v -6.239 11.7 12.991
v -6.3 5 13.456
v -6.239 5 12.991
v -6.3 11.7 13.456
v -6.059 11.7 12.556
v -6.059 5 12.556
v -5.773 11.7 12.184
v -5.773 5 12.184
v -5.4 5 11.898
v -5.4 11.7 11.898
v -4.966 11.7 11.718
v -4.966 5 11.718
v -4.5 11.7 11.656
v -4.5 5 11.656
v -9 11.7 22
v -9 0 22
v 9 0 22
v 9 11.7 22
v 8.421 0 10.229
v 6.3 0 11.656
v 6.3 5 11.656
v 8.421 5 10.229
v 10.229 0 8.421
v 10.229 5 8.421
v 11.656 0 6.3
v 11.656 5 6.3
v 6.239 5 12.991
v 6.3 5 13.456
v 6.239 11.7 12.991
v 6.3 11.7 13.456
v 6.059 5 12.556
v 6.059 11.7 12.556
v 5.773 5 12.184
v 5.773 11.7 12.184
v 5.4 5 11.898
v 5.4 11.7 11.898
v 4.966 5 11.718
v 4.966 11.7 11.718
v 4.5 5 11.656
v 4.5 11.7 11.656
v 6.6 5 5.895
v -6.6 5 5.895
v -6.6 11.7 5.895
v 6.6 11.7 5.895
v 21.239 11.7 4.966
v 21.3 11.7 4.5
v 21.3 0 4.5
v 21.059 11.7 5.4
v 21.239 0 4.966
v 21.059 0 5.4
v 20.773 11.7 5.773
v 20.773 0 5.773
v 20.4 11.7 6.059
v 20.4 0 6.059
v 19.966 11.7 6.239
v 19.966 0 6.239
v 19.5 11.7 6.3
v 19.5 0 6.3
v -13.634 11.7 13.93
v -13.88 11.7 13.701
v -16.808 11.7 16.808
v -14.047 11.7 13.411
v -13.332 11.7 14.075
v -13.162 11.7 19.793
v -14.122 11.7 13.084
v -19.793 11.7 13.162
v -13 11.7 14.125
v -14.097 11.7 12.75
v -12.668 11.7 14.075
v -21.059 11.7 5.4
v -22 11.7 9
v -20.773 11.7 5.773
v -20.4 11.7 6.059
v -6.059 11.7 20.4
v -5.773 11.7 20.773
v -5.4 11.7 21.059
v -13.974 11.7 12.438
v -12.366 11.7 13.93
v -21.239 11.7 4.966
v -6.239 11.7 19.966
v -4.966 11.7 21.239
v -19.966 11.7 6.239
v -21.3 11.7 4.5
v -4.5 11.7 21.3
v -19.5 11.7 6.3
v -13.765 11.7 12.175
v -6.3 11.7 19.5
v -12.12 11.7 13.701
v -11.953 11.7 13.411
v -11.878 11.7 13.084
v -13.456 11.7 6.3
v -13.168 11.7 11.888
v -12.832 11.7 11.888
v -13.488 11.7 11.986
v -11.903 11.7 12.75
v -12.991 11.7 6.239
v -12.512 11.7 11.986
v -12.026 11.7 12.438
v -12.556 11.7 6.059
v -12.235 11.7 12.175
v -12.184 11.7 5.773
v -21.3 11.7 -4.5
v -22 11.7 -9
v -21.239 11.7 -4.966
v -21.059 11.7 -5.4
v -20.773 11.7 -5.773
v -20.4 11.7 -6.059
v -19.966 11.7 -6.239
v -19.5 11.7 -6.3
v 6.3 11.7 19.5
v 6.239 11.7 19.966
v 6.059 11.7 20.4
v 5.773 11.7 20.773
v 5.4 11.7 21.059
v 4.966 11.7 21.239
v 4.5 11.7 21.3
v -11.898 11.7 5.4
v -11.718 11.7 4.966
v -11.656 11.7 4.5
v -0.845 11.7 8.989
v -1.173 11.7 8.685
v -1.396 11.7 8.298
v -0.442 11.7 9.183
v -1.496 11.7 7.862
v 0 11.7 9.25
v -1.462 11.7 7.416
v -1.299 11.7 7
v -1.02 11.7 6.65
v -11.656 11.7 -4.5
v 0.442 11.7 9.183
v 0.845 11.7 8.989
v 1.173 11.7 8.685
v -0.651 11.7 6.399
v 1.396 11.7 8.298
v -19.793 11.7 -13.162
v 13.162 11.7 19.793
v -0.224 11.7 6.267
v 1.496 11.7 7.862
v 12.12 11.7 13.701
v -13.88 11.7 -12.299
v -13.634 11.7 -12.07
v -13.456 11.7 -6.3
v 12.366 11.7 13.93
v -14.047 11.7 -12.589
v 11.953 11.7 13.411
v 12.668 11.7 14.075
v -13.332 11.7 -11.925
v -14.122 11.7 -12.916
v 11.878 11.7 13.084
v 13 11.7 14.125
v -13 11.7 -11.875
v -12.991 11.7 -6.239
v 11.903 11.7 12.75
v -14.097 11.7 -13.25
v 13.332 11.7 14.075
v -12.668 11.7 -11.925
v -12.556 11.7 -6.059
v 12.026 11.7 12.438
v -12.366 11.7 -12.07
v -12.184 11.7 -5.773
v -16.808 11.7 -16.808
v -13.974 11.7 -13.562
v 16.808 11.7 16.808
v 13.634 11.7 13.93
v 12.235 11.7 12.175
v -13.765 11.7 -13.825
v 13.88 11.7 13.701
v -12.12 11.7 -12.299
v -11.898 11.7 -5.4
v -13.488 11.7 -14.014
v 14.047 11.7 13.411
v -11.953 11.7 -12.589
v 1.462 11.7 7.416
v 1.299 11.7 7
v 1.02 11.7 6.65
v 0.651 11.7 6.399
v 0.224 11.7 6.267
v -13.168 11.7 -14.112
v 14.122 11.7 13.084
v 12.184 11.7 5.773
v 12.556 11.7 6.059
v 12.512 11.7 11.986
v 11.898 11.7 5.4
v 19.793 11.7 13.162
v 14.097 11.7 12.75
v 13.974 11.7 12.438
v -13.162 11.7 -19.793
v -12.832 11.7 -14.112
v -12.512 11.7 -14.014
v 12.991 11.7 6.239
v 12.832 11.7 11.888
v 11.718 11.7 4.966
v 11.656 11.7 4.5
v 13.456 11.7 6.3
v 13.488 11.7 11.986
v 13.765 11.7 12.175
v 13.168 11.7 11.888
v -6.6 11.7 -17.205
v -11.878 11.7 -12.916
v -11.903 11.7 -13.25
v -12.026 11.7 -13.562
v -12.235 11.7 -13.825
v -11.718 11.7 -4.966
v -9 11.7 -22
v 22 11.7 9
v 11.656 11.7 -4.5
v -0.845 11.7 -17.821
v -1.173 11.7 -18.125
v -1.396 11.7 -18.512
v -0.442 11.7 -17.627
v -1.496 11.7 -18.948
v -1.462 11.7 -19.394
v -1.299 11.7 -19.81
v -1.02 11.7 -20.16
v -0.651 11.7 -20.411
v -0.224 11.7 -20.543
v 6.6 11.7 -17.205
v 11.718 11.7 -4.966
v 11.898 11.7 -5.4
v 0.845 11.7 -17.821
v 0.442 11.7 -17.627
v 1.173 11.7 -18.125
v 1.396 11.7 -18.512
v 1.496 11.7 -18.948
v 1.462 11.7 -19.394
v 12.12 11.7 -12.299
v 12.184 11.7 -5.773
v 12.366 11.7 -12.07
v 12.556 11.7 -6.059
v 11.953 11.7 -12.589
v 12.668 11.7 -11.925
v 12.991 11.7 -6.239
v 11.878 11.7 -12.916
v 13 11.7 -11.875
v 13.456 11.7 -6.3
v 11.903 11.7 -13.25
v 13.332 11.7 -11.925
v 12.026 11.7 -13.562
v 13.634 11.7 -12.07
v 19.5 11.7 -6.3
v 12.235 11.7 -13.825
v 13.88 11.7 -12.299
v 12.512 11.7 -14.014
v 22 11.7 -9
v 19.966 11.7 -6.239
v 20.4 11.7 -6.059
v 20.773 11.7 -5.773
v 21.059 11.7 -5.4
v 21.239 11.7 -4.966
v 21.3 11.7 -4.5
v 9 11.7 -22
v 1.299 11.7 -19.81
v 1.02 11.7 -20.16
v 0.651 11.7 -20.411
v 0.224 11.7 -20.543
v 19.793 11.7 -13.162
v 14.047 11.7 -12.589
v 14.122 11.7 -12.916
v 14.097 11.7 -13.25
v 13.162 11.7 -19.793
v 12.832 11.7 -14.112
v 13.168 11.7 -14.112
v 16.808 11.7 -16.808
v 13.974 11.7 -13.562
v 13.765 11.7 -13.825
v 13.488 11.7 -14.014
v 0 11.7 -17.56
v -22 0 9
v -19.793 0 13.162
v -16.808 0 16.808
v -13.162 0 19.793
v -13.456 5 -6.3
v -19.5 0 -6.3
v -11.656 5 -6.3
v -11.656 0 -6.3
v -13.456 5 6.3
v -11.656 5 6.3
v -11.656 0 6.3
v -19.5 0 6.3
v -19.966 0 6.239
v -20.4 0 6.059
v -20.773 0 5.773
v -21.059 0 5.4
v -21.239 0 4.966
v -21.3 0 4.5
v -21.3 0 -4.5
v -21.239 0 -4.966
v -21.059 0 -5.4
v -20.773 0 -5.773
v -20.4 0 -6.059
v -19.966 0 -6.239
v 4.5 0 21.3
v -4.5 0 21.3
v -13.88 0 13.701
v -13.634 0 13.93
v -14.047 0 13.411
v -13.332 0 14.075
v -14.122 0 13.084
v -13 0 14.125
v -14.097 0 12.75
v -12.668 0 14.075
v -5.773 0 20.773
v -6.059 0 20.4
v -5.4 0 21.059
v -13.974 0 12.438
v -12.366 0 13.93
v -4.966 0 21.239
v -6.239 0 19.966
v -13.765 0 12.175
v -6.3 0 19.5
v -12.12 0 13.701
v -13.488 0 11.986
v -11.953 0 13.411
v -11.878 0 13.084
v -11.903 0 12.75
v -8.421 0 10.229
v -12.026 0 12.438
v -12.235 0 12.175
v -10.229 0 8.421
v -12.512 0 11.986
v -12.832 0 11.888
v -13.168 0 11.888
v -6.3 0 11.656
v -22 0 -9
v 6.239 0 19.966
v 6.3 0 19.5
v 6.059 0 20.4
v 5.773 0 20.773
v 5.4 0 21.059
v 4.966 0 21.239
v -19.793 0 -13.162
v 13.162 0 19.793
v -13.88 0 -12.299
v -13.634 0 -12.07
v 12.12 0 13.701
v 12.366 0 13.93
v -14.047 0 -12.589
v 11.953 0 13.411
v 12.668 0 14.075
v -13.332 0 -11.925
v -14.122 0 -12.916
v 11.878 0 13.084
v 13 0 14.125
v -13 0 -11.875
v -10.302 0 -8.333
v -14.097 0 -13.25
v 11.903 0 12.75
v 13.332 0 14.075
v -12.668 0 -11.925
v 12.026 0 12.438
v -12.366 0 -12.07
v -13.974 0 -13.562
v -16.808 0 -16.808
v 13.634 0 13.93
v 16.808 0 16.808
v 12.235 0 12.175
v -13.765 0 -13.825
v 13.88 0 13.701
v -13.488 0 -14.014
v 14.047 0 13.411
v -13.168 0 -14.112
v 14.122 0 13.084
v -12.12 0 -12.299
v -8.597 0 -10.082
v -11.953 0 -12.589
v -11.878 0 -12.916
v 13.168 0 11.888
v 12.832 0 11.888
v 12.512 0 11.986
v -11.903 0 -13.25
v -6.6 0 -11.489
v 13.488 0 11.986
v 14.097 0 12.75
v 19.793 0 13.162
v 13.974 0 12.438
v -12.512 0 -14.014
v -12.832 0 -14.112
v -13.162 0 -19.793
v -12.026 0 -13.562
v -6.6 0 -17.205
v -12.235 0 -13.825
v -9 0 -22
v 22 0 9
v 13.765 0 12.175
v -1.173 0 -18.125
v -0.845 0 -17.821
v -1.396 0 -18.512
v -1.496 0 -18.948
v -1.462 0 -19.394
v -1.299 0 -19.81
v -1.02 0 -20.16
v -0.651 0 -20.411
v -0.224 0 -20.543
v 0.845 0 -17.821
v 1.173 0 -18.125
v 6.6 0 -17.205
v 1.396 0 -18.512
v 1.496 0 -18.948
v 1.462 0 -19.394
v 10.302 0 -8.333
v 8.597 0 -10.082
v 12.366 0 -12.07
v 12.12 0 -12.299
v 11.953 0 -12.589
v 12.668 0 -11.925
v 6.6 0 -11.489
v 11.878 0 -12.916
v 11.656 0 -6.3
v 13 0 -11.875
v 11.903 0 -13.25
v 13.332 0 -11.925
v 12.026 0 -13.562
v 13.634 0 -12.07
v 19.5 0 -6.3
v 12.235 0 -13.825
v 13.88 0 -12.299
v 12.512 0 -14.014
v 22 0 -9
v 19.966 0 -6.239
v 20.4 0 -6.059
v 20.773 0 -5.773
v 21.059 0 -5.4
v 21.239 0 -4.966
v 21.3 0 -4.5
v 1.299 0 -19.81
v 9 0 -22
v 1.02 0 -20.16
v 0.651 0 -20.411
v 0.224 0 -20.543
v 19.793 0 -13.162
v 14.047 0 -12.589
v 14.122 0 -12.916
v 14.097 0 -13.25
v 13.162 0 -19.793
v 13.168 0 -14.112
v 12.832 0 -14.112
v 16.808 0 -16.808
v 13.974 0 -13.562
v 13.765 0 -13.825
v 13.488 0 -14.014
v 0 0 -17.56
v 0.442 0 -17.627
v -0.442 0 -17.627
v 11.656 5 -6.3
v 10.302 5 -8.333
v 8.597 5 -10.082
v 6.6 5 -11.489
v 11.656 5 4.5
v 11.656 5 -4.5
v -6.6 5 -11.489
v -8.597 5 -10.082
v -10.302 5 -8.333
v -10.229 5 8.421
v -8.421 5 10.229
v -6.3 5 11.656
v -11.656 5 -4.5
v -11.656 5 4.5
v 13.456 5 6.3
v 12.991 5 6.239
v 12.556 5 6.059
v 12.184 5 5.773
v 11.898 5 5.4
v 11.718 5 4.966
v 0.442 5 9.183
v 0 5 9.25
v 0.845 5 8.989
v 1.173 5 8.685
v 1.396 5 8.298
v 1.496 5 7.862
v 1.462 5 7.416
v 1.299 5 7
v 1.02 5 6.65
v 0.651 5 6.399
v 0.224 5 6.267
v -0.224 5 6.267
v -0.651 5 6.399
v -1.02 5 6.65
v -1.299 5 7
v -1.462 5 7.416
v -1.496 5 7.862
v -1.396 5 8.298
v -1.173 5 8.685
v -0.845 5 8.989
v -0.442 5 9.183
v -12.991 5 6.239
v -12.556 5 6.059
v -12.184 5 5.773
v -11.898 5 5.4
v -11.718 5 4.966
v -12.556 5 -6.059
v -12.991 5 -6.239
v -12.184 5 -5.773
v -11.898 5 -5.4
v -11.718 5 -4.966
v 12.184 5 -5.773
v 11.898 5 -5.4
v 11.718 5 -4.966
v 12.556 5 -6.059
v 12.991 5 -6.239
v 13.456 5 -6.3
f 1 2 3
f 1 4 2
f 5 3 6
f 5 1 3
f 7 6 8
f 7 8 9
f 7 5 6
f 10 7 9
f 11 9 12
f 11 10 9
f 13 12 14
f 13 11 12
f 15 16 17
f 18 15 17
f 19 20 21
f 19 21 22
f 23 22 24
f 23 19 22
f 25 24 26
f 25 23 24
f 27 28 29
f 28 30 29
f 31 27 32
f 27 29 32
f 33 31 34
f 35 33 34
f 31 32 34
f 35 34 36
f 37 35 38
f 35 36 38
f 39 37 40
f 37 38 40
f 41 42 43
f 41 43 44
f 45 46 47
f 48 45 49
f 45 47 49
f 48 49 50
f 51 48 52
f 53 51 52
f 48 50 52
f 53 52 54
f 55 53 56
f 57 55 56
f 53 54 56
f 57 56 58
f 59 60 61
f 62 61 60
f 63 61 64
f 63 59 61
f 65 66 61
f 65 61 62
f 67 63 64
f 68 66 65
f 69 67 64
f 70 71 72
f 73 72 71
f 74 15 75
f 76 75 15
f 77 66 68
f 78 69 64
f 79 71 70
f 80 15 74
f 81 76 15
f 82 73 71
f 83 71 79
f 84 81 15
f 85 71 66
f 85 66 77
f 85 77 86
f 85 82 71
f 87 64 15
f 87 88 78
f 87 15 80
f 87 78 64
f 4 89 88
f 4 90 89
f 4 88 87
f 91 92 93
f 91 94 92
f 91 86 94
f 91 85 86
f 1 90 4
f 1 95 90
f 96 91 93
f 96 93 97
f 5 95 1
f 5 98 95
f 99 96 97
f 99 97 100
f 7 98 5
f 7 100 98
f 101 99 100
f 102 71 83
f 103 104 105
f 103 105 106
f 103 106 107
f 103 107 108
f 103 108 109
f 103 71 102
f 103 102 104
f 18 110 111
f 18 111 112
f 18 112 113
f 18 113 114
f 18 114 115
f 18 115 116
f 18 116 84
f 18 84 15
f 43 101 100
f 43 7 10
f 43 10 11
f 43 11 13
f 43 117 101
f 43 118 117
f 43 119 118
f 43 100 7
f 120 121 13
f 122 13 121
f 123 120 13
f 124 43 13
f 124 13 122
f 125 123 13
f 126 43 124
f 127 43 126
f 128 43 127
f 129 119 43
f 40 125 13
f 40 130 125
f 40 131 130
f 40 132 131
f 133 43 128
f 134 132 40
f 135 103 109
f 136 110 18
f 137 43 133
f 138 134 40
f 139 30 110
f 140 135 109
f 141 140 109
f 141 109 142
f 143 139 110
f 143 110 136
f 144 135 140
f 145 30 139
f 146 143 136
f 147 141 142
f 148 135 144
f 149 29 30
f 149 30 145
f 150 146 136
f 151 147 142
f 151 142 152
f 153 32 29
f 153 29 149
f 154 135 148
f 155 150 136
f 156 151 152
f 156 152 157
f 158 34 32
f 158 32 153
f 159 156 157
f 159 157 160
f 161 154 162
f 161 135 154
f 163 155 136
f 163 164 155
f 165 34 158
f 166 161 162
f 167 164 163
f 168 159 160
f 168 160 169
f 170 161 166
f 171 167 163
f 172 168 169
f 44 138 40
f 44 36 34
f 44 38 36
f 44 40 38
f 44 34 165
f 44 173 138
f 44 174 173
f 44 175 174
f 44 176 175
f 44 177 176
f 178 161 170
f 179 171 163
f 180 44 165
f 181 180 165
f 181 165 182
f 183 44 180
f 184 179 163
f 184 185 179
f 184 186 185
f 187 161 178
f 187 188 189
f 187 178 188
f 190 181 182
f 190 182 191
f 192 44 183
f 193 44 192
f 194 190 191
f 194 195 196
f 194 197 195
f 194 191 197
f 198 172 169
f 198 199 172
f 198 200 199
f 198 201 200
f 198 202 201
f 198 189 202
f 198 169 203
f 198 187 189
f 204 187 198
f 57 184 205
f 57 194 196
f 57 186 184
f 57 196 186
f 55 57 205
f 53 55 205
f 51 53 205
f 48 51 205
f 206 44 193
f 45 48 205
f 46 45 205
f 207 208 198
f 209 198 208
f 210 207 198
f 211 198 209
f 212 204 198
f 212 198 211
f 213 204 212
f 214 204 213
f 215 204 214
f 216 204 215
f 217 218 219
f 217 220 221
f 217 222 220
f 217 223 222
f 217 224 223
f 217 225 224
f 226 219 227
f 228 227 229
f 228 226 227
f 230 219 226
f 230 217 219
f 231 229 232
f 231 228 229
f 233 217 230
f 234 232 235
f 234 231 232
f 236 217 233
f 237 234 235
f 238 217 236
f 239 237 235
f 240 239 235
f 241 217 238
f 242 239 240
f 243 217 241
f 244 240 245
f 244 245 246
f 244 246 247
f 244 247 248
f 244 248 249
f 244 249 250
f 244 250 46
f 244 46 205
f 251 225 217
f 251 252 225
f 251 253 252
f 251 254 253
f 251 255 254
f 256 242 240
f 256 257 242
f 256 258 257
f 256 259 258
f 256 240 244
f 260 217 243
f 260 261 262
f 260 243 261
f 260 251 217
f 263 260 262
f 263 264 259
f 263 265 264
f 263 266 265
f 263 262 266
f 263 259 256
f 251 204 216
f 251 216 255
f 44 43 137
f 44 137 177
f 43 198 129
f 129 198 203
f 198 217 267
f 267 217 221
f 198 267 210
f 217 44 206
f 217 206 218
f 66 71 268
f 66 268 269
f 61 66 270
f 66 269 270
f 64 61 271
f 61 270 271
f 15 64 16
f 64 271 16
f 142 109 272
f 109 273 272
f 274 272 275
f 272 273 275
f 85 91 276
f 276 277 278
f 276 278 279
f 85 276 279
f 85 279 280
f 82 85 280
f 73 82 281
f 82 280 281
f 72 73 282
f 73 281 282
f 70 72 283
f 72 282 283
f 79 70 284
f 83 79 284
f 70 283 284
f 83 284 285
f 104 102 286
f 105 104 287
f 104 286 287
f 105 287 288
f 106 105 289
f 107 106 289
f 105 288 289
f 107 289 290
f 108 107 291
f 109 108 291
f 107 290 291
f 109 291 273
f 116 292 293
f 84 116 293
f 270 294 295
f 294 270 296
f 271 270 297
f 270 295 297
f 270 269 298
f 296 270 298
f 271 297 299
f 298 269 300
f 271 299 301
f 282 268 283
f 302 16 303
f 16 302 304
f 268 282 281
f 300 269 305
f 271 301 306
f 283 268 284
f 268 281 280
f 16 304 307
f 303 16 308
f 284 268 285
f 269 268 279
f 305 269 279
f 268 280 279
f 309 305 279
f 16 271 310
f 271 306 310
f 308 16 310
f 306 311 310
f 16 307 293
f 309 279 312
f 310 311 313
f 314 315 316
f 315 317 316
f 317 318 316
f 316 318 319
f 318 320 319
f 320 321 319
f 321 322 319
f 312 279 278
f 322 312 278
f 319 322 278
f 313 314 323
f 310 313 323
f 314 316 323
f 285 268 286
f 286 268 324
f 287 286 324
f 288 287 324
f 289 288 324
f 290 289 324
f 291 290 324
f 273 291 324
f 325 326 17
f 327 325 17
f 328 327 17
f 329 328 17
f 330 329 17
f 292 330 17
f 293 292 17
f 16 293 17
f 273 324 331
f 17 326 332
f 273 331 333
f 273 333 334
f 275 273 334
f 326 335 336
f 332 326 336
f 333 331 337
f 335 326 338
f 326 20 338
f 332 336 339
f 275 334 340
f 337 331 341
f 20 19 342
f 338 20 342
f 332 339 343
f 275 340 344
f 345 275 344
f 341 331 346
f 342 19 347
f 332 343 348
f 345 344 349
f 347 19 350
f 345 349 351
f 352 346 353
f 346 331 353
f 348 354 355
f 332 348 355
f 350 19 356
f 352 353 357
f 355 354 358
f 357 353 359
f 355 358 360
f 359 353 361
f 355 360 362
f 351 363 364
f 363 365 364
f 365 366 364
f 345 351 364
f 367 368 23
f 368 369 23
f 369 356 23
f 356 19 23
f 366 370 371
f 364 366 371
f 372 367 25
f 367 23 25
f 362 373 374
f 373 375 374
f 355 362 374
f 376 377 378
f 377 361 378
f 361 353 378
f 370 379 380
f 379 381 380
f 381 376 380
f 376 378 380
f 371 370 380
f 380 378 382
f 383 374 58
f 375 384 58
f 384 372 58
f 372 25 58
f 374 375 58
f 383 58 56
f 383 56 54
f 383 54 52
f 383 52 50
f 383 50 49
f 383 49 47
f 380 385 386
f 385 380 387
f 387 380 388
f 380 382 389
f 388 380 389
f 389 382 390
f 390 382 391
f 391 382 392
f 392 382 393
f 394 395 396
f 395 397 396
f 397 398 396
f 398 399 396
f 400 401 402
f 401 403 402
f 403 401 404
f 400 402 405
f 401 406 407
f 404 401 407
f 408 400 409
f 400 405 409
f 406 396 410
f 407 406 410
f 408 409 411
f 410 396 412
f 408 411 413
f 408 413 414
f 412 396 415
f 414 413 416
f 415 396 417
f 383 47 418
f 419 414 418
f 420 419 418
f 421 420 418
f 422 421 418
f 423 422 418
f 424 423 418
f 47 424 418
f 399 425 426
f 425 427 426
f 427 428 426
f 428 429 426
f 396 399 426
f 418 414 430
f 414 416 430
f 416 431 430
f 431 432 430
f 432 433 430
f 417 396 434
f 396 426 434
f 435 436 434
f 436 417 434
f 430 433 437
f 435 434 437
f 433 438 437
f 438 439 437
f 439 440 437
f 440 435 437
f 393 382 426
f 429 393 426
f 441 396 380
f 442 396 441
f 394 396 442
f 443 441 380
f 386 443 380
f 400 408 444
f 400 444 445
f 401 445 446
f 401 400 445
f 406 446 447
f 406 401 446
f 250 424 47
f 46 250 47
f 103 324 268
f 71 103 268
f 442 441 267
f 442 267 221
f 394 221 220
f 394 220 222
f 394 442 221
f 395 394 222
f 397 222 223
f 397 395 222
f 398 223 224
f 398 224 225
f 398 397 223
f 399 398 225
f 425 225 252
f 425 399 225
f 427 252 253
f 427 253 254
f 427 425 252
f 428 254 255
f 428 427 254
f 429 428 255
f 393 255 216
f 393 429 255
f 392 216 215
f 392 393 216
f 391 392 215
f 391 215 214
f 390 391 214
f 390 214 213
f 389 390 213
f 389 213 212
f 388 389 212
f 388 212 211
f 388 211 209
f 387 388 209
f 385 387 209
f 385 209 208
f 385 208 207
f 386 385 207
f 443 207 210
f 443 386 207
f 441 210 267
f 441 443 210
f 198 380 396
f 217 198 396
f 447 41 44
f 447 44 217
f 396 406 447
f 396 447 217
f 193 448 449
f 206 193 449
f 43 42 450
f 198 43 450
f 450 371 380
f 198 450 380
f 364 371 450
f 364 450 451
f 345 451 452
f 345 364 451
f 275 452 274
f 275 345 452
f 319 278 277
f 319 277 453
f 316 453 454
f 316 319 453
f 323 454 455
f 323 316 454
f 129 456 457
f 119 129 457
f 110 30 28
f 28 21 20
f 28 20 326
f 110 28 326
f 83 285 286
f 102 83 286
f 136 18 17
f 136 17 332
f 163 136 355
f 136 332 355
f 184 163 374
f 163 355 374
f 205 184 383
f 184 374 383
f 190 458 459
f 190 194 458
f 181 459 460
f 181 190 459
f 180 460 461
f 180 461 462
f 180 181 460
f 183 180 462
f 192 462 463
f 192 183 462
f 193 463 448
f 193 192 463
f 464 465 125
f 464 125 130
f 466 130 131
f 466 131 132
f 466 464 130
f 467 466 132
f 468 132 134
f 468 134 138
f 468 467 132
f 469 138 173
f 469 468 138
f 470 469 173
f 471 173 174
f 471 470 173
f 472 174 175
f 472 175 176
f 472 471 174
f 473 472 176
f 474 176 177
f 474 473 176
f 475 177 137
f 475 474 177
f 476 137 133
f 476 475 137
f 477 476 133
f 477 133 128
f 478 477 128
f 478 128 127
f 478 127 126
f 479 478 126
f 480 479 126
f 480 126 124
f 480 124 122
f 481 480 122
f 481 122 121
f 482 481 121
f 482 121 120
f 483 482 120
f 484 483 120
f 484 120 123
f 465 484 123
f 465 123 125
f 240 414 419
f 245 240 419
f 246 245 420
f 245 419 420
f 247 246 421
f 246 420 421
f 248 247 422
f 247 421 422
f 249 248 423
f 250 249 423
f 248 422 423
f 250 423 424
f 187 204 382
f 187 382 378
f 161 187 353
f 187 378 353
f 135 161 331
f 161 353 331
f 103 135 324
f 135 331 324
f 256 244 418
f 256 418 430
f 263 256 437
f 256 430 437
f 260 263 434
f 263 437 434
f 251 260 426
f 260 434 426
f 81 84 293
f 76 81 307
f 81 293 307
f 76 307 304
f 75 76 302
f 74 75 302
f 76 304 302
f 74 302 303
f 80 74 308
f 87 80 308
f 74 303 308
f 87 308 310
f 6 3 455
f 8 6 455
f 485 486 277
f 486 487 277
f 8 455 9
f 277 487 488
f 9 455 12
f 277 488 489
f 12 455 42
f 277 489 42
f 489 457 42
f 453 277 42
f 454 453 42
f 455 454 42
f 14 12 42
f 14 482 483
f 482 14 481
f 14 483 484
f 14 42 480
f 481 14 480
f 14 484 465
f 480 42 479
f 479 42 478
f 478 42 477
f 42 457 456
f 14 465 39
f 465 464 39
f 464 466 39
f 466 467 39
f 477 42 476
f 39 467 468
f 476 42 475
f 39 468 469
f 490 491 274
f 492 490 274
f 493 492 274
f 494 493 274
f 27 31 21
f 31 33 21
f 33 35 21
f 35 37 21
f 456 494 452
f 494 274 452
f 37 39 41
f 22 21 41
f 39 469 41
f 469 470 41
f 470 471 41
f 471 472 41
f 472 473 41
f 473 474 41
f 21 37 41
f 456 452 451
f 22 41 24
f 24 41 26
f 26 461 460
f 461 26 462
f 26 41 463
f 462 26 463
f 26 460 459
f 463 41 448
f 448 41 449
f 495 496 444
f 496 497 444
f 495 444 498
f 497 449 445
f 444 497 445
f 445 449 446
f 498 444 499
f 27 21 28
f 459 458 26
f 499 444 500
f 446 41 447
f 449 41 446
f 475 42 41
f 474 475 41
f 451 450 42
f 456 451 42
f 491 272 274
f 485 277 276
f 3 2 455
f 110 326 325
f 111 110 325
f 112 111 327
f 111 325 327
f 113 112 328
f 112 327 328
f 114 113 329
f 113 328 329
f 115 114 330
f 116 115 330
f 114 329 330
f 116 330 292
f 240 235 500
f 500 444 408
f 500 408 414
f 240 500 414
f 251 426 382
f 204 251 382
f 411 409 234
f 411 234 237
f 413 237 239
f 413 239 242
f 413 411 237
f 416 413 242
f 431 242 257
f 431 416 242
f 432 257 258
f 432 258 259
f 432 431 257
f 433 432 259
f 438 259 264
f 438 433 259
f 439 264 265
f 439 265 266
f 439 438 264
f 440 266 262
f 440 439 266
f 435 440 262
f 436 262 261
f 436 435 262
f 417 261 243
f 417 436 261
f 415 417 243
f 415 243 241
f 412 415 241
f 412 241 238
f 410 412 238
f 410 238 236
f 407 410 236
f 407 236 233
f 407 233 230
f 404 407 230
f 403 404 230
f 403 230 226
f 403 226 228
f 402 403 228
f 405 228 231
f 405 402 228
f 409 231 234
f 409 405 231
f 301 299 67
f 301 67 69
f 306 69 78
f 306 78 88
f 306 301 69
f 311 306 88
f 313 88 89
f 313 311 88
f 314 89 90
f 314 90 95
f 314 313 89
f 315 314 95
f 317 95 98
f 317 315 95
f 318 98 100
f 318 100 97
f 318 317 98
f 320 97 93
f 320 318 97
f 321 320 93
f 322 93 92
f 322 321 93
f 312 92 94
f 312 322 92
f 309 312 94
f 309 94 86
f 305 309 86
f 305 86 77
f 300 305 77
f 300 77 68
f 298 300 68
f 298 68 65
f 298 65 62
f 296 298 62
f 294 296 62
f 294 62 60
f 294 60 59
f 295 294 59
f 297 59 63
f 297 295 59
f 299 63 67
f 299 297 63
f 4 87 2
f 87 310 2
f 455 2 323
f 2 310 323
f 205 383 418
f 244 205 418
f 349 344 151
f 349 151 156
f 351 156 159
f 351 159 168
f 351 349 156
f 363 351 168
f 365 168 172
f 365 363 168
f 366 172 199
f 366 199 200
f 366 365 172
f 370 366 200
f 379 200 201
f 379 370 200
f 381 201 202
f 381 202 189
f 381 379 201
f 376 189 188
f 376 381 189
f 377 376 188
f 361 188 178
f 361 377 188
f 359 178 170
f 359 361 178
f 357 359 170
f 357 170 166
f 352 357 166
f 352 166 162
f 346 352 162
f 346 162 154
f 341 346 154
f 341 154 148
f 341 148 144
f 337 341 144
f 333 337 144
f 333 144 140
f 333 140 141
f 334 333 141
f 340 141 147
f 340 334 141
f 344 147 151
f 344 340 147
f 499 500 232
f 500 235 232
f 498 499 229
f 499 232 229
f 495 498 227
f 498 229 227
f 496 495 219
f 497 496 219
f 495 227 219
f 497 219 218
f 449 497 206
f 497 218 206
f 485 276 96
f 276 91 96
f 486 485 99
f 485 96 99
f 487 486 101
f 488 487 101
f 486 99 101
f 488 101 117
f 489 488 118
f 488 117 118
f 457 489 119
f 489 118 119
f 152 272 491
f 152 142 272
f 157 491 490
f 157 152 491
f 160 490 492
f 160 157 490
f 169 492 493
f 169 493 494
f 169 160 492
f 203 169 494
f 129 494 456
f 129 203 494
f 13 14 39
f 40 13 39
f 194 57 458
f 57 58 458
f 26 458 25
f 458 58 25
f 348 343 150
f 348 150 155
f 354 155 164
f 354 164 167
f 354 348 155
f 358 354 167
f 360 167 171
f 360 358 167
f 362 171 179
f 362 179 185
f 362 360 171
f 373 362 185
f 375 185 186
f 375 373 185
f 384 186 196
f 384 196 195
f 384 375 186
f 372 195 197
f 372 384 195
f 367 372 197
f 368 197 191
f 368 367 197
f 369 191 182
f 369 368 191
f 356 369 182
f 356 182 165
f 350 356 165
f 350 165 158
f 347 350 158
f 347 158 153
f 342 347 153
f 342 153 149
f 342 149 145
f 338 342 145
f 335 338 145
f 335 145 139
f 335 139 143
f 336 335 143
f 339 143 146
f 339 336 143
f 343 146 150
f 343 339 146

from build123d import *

# Parameters (mm, degrees)
SKETCH2_R           = 1.125
SKETCH2_R_2         = 1.5
SKETCH2_W           = 13.2
SKETCH2_H           = 23.1
BOSS_EXTRUDE3_DEPTH = 11.7
SKETCH2_9_R         = 1.5
CUT_EXTRUDE3_DEPTH  = 5
FILLET1_R           = 1.8


with BuildPart() as part:
    # Sketch2 → Boss-Extrude3 (new body)
    with BuildSketch(Plane(origin=(0, 0, 0), x_dir=(1, 0, 0), z_dir=(0, 1, 0))):
        with BuildLine():
            ThreePointArc((-9, 22), (-16.807736314, 16.807736314), (-22, 9))
            Line((-22, 9), (-22, -9))
            ThreePointArc((-22, -9), (-16.807736314, -16.807736314), (-9, -22))
            Line((-9, -22), (9, -22))
            ThreePointArc((9, -22), (16.807736314, -16.807736314), (22, -9))
            Line((22, -9), (22, 9))
            ThreePointArc((22, 9), (16.807736314, 16.807736314), (9, 22))
            Line((9, 22), (-9, 22))
        make_face()
        with Locations(Location((-13, -13, 0), (0, 0, 270))):
            Circle(SKETCH2_R, mode=Mode.SUBTRACT)
        with BuildLine():
            Line((6.3, -11.65643599), (6.3, -19.5))
            ThreePointArc((6.3, -19.5), (5.772792206, -20.772792206), (4.5, -21.3))
            Line((4.5, -21.3), (-4.5, -21.3))
            ThreePointArc((-4.5, -21.3), (-5.772792206, -20.772792206), (-6.3, -19.5))
            Line((-6.3, -19.5), (-6.3, -11.65643599))
            Line((-6.3, -11.65643599), (6.3, -11.65643599))
        make_face(mode=Mode.SUBTRACT)
        with Locations(Location((13, -13, 0), (0, 0, 270))):
            Circle(SKETCH2_R, mode=Mode.SUBTRACT)
        with Locations(Location((0, -7.75, 0), (0, 0, 270))):
            Circle(SKETCH2_R_2, mode=Mode.SUBTRACT)
        with BuildLine():
            Line((-19.5, 6.3), (-11.65643599, 6.3))
            Line((-11.65643599, 6.3), (-11.65643599, -6.3))
            Line((-11.65643599, -6.3), (-19.5, -6.3))
            ThreePointArc((-19.5, -6.3), (-20.772792206, -5.772792206), (-21.3, -4.5))
            Line((-21.3, -4.5), (-21.3, 4.5))
            ThreePointArc((-21.3, 4.5), (-20.772792206, 5.772792206), (-19.5, 6.3))
        make_face(mode=Mode.SUBTRACT)
        with Locations(Location((0, 19.06, 0), (0, 0, 270))):
            Circle(SKETCH2_R_2, mode=Mode.SUBTRACT)
        with Locations((0, 5.655)):
            Rectangle(SKETCH2_W, SKETCH2_H, mode=Mode.SUBTRACT)
        with BuildLine():
            Line((11.65643599, 6.3), (19.5, 6.3))
            ThreePointArc((19.5, 6.3), (20.772792206, 5.772792206), (21.3, 4.5))
            Line((21.3, 4.5), (21.3, -4.5))
            ThreePointArc((21.3, -4.5), (20.772792206, -5.772792206), (19.5, -6.3))
            Line((19.5, -6.3), (11.65643599, -6.3))
            Line((11.65643599, -6.3), (11.65643599, 6.3))
        make_face(mode=Mode.SUBTRACT)
        with Locations(Location((13, 13, 0), (0, 0, 270))):
            Circle(SKETCH2_R, mode=Mode.SUBTRACT)
        with Locations(Location((-13, 13, 0), (0, 0, 270))):
            Circle(SKETCH2_R, mode=Mode.SUBTRACT)
    extrude(amount=BOSS_EXTRUDE3_DEPTH)

    # Sketch2<9> → Cut-Extrude3 (cut)
    with BuildSketch(Plane(origin=(0, 0, 0), x_dir=(1, 0, 0), z_dir=(0, 1, 0))):
        with BuildLine():
            Line((-6.3, -11.65643599), (6.3, -11.65643599))
            ThreePointArc((6.3, -11.65643599), (9.369164851, -9.369164851), (11.65643599, -6.3))
            Line((11.65643599, -6.3), (11.65643599, 6.3))
            ThreePointArc((11.65643599, 6.3), (9.489805129, 9.246950774), (6.6, 11.489234091))
            Line((6.6, 11.489234091), (6.6, -5.895))
            Line((6.6, -5.895), (-6.6, -5.895))
            Line((-6.6, -5.895), (-6.6, 11.489234091))
            ThreePointArc((-6.6, 11.489234091), (-9.489805129, 9.246950774), (-11.65643599, 6.3))
            Line((-11.65643599, 6.3), (-11.65643599, -6.3))
            ThreePointArc((-11.65643599, -6.3), (-9.369164851, -9.369164851), (-6.3, -11.65643599))
        make_face()
        with Locations(Location((0, -7.75, 0), (0, 0, 270))):
            Circle(SKETCH2_9_R, mode=Mode.SUBTRACT)
    extrude(amount=CUT_EXTRUDE3_DEPTH, mode=Mode.SUBTRACT)

    # Fillet1
    fillet1_edges = [part.edges().sort_by_distance(p)[0] for p in [
        (-11.65643599, 8.35, 6.3),
        (-11.65643599, 8.35, -6.3),
        (6.3, 8.35, 11.65643599),
        (-6.3, 8.35, 11.65643599),
        (11.65643599, 8.35, -6.3),
        (11.65643599, 8.35, 6.3),
    ]]
    fillet(fillet1_edges, radius=FILLET1_R)


solid = part.part
